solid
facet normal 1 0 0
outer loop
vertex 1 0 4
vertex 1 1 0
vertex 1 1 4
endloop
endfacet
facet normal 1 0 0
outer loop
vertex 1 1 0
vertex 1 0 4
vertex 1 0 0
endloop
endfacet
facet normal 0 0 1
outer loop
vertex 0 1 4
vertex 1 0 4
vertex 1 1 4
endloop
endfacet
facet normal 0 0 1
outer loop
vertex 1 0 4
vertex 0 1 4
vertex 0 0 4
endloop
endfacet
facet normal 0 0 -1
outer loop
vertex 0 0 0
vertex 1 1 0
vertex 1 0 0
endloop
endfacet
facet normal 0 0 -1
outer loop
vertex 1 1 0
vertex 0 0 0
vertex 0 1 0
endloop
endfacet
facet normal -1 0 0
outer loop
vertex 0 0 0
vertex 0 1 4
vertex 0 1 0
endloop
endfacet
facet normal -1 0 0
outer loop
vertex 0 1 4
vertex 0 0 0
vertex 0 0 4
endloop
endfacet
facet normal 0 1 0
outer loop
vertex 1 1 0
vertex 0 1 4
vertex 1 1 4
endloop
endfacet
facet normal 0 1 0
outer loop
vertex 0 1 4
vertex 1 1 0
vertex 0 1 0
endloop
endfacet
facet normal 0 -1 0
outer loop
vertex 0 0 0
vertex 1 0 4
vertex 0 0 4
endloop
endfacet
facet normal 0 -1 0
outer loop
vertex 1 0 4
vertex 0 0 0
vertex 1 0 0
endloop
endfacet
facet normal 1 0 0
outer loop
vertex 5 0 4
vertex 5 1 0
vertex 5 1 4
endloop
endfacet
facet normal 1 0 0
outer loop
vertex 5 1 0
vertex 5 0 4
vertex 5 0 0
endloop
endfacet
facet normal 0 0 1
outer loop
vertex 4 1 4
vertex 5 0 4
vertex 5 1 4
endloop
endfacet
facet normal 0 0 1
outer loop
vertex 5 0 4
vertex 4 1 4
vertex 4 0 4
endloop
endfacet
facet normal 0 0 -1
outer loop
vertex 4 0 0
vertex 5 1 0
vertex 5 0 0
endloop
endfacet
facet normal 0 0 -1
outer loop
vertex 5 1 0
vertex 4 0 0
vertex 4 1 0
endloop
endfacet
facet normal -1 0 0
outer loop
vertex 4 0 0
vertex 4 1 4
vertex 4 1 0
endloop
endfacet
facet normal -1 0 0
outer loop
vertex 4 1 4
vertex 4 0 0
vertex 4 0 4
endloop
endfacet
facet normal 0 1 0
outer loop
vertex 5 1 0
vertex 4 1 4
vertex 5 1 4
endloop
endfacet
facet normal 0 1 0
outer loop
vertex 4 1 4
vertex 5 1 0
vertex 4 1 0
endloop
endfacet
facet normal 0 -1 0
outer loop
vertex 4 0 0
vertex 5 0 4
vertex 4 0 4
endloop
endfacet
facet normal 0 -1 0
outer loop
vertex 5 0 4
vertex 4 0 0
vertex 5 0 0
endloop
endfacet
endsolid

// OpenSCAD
union() {
  translate([0, 0, 0]) cube(size=[1,1,4], center=false);
  translate([4, 0, 0]) cube(size=[1,1,4], center=false);
}
